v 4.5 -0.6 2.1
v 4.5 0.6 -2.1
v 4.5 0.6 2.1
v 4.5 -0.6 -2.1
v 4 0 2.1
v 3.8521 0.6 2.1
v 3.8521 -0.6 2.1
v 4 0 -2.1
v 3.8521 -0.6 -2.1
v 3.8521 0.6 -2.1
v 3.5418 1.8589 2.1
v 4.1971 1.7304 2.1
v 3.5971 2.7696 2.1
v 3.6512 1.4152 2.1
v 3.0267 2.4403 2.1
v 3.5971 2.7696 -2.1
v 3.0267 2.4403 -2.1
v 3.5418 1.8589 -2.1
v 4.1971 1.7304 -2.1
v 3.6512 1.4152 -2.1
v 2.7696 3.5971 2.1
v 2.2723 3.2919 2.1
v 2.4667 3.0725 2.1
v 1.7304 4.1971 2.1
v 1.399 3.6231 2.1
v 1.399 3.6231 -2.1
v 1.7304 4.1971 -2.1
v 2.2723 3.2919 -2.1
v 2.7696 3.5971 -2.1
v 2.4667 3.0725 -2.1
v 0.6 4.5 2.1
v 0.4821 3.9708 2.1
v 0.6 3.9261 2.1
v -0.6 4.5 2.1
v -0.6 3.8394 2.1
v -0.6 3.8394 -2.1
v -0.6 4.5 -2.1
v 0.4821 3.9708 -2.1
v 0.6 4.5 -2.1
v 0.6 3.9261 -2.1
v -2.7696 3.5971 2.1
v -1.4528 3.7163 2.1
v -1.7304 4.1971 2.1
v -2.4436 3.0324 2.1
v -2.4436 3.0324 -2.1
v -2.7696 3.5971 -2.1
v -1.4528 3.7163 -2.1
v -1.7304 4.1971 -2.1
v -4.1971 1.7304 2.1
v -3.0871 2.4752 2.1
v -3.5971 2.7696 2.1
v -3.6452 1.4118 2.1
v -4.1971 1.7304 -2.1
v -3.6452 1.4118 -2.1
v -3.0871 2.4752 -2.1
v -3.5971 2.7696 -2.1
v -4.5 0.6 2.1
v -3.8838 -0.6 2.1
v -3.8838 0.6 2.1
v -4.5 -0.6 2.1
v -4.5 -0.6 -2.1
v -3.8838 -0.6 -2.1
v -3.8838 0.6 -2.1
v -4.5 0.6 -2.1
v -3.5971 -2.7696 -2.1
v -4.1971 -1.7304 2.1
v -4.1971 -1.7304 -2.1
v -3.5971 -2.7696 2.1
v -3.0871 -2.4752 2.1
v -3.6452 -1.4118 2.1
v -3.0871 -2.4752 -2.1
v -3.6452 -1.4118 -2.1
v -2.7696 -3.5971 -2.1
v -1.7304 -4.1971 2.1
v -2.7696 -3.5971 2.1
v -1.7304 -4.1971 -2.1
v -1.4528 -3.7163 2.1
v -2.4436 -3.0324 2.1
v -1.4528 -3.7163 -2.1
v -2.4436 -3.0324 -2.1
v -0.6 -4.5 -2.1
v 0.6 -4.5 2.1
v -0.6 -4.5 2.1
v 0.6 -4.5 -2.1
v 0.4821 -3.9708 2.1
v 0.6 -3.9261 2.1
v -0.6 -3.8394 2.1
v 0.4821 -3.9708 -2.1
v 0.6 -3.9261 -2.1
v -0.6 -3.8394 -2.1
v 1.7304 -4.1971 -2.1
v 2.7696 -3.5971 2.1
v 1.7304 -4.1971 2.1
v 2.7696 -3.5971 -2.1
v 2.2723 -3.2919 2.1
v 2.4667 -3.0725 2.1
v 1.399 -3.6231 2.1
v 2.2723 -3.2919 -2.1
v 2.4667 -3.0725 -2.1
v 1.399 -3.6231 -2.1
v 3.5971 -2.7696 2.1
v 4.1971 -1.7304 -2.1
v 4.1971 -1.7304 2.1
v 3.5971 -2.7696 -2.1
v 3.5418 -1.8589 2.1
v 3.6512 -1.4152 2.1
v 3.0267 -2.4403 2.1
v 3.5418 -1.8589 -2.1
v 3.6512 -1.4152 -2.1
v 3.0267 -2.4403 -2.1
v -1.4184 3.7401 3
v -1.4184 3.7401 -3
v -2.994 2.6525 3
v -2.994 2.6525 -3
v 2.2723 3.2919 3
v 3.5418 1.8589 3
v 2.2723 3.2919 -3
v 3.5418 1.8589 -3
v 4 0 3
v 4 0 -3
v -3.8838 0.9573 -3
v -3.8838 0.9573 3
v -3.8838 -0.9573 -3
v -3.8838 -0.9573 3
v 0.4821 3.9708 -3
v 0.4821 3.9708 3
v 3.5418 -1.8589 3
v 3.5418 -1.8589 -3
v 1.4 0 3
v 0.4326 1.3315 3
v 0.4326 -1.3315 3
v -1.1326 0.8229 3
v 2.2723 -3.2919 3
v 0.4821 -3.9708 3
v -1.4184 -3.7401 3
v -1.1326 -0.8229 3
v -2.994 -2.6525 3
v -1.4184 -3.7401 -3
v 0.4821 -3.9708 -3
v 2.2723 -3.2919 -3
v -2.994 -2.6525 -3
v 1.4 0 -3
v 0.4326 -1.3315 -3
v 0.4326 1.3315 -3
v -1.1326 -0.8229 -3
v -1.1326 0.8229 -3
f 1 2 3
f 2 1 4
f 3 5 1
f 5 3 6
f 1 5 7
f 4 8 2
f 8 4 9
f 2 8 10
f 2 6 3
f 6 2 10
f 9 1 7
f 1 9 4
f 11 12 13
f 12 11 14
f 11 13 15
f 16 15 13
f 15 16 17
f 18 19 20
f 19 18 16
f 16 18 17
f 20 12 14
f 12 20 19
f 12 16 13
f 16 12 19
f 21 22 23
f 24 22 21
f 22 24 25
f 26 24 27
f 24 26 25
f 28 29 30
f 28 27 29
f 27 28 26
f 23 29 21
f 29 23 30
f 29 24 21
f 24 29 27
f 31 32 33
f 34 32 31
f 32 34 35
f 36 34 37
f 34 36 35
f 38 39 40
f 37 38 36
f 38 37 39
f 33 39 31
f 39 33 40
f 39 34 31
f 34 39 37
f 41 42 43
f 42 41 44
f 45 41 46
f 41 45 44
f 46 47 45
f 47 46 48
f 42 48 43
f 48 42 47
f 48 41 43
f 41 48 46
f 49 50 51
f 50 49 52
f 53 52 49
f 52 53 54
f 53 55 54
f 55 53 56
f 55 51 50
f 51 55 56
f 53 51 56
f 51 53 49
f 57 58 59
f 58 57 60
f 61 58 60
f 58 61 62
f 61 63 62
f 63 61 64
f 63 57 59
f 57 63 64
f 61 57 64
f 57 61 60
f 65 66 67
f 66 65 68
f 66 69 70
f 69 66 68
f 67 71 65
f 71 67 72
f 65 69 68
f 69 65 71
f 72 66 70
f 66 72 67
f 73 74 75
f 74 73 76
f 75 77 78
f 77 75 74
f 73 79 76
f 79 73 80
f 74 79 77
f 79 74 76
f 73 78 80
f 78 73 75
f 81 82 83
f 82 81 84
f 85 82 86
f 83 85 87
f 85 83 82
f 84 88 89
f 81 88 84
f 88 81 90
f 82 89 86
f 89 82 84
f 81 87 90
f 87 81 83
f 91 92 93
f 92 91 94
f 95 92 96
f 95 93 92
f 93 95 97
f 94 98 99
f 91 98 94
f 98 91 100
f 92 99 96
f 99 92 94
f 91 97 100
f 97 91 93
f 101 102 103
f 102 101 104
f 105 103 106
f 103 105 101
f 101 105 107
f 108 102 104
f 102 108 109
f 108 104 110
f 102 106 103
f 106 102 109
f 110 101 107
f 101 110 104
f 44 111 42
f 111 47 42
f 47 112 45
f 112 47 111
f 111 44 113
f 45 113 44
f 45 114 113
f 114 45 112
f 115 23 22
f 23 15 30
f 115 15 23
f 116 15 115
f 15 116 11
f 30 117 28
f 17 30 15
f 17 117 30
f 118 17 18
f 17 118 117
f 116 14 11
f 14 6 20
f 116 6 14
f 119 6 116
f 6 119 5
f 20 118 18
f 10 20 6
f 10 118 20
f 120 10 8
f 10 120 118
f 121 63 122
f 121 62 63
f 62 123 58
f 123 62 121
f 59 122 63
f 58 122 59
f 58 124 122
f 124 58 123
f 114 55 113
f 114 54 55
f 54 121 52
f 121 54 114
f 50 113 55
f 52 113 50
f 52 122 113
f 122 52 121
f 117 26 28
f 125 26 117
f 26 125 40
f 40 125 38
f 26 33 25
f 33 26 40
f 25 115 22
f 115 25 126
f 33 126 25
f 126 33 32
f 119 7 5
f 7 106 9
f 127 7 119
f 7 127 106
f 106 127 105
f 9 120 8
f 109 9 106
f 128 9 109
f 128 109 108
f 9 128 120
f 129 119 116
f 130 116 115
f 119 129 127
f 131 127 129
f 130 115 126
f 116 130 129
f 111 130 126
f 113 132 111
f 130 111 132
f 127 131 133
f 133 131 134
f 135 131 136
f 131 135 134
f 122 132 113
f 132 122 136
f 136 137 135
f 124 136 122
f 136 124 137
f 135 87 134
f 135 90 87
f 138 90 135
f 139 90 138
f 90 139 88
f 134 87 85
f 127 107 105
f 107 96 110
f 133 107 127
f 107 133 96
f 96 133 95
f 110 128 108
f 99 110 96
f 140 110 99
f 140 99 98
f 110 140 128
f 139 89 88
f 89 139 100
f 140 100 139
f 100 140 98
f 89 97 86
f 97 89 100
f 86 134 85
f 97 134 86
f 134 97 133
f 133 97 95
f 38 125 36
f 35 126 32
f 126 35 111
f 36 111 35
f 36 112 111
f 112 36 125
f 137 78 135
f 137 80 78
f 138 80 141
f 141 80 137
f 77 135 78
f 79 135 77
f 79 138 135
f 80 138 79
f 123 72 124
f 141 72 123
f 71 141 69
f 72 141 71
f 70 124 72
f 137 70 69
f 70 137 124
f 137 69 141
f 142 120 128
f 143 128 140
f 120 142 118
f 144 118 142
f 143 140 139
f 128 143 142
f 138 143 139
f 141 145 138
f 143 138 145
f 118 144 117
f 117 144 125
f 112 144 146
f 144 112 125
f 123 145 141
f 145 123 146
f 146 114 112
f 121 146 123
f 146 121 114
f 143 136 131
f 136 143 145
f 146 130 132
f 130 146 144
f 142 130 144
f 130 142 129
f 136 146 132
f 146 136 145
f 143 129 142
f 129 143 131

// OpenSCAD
// Parameters
screw_diameter = 3; //[1.5:6:0.1]
outer_diameter = 8; //[4:16:0.1]
length = 6; //[3:12:0.1]
thread_minor_diameter = 2.5; //[1.8:4.5:0.05]
thread_clearance = 0.15; //[0.05:0.4:0.01]
rib_count = 12; //[6:24:1]
rib_radial_height = 0.5; //[0.2:1.2:0.05]
rib_tangential_width = 1.2; //[0.6:2.4:0.05]
rib_axial_height = 4.2; //[2:10:0.1]
rib_overlap = 0.8; //[0.3:2:0.05]
entry_chamfer_height = 0.8; //[0.3:2:0.05]
lead_in_chamfer_height = 0.6; //[0.3:2:0.05]
chamfer_radial_reduction = 0.6; //[0.2:1.5:0.05]
inner_void_bottom_offset = 0.6; //[0.3:2:0.05]
eps_overlap = 0.8; //[0.2:2:0.05]

// M3x8 Insert - complete geometry
module insert() {
  color("Brass") {
    // Base cylinder
    cylinder(r=outer_diameter/2, h=length, center=true);

    // Ribs
    for (i = [0:rib_count-1]) {
      rotate([0, 0, i*360/rib_count])
      translate([outer_diameter/2 - rib_overlap + (rib_radial_height + rib_overlap)/2, 0, 0])
      cube([rib_radial_height + rib_overlap, rib_tangential_width, rib_axial_height], center=true);
    }

    // Entry chamfer
    translate([0, 0, length/2 - entry_chamfer_height/2])
    cylinder(r1=outer_diameter/2, r2=outer_diameter/2 - chamfer_radial_reduction, h=entry_chamfer_height, center=true);

    // Lead-in chamfer
    translate([0, 0, -length/2 + lead_in_chamfer_height/2])
    cylinder(r1=outer_diameter/2 - chamfer_radial_reduction, r2=outer_diameter/2, h=lead_in_chamfer_height, center=true);
  }
}

// Threaded Insert - complete geometry
module threaded_insert() {
  difference() {
    insert();
    // Internal thread void
    translate([0, 0, inner_void_bottom_offset])
    cylinder(r=thread_minor_diameter/2 + thread_clearance, h=length + 2*eps_overlap, center=true);
  }
}

// Assembly
module assembly() {
  threaded_insert();
}

assembly();
